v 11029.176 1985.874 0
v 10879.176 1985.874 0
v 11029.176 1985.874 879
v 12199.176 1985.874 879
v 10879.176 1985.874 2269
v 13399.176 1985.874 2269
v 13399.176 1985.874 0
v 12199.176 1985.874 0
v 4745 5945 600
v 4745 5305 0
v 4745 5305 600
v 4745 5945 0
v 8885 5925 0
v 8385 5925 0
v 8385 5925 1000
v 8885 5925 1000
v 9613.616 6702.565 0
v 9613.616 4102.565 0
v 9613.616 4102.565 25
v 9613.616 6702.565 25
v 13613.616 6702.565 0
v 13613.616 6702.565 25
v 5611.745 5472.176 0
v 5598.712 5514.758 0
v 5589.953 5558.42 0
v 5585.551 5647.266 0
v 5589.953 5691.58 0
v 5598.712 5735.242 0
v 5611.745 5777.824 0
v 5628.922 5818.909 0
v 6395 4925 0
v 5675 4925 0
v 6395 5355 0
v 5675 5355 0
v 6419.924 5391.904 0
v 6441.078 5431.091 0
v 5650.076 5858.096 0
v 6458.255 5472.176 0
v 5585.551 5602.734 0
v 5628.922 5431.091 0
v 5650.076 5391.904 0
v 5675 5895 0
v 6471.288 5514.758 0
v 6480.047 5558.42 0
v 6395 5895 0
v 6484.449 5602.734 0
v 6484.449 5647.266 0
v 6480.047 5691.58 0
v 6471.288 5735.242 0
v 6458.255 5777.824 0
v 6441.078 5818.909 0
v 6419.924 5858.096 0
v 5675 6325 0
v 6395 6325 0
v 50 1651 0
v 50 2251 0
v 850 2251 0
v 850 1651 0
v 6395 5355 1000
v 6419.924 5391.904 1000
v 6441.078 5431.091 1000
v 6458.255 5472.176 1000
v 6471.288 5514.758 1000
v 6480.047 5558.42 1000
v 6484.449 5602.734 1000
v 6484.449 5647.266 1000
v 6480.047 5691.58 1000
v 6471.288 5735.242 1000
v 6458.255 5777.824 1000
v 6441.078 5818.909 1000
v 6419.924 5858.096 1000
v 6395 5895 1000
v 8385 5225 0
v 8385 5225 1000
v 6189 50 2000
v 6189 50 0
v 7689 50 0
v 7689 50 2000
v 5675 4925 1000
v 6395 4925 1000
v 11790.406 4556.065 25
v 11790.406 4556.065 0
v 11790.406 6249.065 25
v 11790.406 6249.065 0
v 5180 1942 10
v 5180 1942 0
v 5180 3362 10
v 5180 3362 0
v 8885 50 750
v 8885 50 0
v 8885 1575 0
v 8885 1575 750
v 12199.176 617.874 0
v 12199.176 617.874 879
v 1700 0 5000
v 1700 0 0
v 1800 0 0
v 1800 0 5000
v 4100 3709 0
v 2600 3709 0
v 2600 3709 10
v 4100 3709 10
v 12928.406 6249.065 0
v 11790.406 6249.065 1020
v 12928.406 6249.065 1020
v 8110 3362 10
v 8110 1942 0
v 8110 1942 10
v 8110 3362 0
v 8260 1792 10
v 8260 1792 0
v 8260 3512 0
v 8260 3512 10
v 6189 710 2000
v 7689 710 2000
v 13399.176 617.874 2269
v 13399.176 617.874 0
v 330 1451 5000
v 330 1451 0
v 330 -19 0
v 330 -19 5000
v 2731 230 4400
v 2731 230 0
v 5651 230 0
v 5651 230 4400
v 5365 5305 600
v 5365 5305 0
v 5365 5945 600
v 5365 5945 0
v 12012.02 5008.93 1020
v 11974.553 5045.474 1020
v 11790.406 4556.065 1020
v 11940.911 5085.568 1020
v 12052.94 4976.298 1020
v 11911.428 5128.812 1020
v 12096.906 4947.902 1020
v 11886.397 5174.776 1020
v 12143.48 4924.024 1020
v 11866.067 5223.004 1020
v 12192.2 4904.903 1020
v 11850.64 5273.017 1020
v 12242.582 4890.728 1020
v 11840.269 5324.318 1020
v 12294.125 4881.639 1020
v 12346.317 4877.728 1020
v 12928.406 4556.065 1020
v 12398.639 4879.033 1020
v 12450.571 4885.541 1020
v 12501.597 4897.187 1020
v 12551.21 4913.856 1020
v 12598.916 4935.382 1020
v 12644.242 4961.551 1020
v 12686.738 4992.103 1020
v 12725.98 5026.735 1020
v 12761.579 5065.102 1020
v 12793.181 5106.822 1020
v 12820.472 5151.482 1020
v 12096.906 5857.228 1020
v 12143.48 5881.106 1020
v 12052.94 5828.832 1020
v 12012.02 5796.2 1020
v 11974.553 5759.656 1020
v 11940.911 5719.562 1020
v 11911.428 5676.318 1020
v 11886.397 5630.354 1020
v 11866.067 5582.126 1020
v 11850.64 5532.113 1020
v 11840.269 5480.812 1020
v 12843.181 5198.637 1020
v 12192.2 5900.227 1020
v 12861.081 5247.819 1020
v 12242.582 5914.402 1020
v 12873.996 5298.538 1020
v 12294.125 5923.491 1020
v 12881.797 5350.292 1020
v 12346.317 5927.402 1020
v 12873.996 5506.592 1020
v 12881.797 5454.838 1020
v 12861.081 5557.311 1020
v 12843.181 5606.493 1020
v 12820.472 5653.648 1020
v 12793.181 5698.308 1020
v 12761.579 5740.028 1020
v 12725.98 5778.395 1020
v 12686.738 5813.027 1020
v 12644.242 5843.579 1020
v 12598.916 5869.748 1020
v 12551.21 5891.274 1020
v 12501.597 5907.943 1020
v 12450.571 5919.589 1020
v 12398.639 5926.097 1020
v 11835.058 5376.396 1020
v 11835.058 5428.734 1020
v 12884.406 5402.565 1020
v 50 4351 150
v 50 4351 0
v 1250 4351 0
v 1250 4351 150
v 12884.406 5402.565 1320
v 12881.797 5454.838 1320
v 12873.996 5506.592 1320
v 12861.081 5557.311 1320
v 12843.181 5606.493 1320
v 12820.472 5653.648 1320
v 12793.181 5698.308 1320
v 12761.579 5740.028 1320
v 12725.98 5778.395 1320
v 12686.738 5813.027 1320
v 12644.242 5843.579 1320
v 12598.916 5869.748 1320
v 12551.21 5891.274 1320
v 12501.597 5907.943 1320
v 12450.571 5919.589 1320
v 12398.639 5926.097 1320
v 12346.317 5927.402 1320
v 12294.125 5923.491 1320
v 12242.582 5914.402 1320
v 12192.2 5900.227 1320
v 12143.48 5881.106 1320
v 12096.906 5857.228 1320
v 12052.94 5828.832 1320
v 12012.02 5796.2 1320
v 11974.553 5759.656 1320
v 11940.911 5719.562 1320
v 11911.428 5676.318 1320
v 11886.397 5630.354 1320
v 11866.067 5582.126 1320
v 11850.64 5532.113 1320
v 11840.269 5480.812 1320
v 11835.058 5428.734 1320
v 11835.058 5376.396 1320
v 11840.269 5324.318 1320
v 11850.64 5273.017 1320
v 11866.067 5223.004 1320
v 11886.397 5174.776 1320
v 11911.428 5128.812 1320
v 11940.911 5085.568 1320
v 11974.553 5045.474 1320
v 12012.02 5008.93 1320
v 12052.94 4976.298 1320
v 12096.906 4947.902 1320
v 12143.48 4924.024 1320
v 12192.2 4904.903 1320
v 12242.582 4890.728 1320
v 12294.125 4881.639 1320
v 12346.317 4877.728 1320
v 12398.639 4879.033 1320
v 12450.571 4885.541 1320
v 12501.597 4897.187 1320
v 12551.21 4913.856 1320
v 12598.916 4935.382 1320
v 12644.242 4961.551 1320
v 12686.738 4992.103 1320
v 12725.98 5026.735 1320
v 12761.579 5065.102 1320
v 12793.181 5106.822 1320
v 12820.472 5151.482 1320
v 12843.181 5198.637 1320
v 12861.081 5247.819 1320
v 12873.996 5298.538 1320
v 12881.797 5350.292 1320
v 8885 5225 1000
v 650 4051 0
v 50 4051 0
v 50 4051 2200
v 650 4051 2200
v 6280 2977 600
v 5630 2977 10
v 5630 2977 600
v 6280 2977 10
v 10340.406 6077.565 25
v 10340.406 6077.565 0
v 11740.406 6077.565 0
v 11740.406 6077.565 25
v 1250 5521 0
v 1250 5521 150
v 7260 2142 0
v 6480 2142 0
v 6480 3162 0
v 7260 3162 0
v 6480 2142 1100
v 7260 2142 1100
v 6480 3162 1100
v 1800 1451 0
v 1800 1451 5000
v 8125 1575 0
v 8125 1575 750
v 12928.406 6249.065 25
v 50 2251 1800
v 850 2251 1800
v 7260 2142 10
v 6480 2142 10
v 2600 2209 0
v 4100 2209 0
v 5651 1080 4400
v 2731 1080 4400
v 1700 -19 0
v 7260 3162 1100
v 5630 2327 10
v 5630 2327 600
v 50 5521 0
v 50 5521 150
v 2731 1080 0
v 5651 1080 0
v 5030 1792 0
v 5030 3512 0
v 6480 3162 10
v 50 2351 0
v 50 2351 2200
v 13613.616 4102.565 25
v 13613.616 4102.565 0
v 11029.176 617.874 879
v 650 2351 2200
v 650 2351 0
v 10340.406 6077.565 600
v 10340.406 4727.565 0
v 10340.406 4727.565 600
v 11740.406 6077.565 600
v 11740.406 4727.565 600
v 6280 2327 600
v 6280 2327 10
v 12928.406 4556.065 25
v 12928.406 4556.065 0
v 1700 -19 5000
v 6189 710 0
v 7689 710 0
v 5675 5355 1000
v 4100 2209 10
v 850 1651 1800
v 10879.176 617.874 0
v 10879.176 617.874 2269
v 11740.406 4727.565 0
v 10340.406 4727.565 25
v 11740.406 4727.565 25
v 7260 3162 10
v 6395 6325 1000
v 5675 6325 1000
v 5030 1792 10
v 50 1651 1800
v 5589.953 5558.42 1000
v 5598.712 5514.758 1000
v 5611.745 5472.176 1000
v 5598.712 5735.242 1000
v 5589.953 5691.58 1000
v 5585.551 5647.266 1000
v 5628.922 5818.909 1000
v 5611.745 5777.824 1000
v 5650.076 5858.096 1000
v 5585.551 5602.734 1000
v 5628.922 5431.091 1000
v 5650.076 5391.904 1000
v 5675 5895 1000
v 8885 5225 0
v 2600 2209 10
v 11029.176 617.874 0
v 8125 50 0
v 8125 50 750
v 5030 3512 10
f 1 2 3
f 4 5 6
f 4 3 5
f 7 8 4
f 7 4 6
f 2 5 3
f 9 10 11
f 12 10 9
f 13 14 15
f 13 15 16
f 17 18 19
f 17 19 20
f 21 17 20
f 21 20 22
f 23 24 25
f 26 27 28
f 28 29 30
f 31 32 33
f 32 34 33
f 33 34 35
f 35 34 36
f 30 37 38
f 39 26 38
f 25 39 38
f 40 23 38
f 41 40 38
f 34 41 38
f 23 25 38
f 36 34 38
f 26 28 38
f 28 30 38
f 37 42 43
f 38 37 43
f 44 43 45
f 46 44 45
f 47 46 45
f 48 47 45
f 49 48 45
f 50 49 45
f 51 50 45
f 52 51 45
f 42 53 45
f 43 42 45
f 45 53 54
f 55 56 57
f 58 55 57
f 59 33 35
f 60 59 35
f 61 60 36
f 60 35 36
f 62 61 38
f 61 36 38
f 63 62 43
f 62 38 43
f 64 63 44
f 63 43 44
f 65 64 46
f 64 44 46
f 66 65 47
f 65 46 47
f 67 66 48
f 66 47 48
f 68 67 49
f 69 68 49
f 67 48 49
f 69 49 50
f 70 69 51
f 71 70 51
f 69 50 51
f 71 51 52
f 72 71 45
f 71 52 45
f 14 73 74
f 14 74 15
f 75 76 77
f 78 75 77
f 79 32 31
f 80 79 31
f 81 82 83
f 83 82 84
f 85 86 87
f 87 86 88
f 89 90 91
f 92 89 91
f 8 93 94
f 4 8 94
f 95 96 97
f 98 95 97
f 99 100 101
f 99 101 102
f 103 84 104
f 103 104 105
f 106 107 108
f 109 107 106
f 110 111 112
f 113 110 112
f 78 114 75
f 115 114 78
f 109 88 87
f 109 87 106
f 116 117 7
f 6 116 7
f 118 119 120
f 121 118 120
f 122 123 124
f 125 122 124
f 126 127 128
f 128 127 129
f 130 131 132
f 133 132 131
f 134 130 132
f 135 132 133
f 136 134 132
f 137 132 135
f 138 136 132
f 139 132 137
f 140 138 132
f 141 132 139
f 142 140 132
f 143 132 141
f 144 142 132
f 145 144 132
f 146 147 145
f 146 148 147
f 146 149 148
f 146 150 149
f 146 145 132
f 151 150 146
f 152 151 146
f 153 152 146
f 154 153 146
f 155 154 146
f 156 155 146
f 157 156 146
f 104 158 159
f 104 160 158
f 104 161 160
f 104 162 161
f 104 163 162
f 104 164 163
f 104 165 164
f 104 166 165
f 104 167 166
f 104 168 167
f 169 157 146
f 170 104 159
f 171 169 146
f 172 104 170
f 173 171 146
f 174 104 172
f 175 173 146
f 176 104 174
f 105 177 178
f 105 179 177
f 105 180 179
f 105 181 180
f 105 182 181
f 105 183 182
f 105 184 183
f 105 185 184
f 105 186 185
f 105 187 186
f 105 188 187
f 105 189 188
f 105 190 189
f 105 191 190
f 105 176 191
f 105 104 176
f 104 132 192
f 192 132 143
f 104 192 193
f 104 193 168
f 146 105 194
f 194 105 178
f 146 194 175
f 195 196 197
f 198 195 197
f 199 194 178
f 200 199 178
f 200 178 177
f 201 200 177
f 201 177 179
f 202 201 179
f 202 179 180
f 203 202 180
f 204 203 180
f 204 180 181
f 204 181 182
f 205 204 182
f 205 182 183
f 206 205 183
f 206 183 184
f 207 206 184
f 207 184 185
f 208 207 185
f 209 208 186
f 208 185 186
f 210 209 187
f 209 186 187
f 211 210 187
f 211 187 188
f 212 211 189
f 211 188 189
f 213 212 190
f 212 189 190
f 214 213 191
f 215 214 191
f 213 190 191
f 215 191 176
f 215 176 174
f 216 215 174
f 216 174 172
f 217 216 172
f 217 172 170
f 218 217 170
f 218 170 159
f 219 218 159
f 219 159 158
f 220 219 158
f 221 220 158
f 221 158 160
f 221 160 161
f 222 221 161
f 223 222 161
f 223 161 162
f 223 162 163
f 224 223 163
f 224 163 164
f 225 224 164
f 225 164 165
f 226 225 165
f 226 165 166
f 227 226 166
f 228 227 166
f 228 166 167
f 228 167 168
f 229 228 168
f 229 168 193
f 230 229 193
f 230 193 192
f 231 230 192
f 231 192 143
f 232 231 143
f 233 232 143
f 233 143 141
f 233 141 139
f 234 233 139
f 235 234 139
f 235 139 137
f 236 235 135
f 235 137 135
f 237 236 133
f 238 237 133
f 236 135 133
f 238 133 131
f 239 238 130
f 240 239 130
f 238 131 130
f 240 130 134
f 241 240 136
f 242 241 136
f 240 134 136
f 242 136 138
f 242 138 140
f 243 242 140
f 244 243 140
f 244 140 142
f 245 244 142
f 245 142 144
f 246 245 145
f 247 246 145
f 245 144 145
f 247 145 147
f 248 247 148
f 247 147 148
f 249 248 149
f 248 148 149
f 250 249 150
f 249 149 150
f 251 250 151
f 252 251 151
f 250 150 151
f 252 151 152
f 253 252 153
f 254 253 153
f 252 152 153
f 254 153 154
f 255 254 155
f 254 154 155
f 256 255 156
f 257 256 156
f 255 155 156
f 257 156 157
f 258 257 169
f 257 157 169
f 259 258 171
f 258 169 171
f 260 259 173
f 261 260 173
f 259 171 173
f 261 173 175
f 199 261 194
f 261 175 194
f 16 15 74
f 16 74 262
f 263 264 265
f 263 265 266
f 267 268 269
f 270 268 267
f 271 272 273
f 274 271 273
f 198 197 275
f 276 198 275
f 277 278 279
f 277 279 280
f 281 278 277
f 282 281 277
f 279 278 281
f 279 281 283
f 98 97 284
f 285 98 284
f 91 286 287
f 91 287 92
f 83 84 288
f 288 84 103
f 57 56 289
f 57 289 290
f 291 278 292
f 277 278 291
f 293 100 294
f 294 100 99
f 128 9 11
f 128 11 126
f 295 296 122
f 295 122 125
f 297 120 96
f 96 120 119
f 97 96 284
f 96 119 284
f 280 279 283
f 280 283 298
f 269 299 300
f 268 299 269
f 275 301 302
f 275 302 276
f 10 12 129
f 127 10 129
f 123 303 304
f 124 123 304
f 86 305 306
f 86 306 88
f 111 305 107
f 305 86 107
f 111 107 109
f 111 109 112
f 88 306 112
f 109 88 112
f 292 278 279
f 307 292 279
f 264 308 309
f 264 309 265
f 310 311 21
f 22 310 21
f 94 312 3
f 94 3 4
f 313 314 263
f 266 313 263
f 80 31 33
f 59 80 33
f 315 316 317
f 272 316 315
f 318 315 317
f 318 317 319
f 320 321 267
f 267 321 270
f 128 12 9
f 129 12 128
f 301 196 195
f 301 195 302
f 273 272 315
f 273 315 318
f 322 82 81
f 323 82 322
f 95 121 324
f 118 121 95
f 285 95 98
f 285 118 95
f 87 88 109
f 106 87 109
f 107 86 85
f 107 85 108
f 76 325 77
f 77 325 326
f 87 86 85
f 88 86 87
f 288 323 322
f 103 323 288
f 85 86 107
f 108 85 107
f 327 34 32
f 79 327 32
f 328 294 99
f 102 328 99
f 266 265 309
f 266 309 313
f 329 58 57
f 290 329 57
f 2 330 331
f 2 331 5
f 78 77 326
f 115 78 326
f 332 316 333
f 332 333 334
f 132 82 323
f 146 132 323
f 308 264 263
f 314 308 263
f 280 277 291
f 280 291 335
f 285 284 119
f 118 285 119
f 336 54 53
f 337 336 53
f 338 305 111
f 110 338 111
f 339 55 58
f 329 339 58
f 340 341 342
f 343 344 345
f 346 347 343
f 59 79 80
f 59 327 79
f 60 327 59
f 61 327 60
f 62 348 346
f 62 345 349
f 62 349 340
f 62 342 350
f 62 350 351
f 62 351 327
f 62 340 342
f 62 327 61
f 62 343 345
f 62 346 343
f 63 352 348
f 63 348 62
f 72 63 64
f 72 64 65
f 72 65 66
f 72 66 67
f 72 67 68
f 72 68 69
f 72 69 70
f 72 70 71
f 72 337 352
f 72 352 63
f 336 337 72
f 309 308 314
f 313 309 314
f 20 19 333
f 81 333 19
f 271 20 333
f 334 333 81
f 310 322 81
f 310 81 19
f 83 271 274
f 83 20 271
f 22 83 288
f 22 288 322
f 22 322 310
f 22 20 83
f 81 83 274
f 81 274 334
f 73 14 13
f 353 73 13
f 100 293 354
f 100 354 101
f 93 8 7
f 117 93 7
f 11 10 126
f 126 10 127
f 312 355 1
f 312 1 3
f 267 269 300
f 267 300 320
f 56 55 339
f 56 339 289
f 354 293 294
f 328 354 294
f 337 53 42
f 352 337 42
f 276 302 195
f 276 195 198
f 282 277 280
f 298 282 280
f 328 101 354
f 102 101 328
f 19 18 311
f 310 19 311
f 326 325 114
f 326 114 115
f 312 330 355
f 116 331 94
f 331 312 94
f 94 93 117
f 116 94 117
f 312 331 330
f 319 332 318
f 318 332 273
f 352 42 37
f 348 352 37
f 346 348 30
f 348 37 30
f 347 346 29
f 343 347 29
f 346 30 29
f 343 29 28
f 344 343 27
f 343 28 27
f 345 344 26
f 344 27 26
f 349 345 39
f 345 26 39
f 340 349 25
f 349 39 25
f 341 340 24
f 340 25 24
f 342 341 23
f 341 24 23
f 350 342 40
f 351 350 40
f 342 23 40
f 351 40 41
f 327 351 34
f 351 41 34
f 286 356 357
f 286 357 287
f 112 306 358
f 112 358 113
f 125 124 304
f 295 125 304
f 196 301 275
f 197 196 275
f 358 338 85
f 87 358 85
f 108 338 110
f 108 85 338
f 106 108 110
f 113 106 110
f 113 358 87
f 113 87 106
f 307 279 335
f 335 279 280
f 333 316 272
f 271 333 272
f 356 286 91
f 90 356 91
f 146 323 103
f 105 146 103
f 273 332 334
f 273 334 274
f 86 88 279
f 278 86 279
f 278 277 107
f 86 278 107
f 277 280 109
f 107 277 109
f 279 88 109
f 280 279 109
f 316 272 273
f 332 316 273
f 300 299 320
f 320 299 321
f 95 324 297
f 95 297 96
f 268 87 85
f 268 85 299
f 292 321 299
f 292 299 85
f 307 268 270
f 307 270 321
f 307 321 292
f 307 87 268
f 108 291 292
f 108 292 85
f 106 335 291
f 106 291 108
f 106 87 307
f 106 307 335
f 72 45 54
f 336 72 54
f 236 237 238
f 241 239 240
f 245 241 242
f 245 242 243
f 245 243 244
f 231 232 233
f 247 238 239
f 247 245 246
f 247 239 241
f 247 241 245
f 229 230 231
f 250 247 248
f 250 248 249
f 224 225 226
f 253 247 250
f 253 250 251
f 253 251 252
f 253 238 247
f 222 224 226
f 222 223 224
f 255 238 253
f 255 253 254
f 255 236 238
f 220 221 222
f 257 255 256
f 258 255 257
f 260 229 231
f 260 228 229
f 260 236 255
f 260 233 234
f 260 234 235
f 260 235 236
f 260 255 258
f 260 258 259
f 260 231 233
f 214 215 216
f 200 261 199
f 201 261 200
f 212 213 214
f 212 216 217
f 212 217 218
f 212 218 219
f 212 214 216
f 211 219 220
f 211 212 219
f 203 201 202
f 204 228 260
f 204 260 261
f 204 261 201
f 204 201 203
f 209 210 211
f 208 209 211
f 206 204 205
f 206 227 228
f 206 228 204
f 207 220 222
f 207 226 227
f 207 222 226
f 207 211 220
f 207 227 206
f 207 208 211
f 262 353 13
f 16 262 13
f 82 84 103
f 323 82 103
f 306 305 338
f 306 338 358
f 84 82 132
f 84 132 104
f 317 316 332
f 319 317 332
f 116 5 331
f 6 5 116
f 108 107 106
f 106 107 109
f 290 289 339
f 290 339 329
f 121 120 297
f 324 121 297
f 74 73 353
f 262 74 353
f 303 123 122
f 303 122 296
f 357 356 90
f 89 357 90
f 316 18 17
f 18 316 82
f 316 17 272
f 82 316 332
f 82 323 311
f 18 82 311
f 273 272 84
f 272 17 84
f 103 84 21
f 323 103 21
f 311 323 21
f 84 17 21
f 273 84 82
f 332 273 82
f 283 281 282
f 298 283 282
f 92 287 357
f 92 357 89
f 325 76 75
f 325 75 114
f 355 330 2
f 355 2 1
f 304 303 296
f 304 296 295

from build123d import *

# Parameters (mm, degrees)
F2_DEPTH  = 5000
F1_W      = 2920
F1_H      = 850
F3_DEPTH  = 4400
F1_W_2    = 1500
F1_H_2    = 660
F4_DEPTH  = 2000
F1_W_3    = 780
F1_H_3    = 1020
F5_DEPTH  = 1100
F1_W_4    = 760
F1_H_4    = 1525
F6_DEPTH  = 750
F7_DEPTH  = 1000
F1_W_5    = 500
F1_H_5    = 700
F8_DEPTH  = 1000
F1_W_6    = 620
F1_H_6    = 640
F9_DEPTH  = 600
F1_W_7    = 600
F1_H_7    = 1700
F10_DEPTH = 2200
F1_W_8    = 800
F1_H_8    = 600
F11_DEPTH = 1800
F1_H_9    = 1500
F12_DEPTH = 10
F1_W_9    = 1200
F1_H_10   = 1170
F13_DEPTH = 150
F1_W_10   = 3230
F1_H_11   = 1720
F1_W_11   = 2930
F1_H_12   = 1420
F14_DEPTH = 10
F1_W_12   = 650
F1_H_13   = 650
F15_DEPTH = 10
F16_W     = 1138
F16_H     = 1693
F16_R     = 525
F17_DEPTH = 1020
F18_DEPTH = 1320
F16_W_2   = 1400
F16_H_2   = 1350
F19_DEPTH = 600
F16_W_3   = 4000
F16_H_3   = 2600
F20_DEPTH = 25
F21_W     = 2520
F21_H     = 1368
F22_DEPTH = 2269
F23_W     = 1170
F23_H     = 879
F24_DEPTH = 1368
F25_DEPTH = 600


with BuildPart() as f2:
    # F1 (on face) → F2 (new body)
    with BuildSketch(Plane.XY):
        Polygon((330, 1451), (330, -19), (1700, -19), (1700, 0), (1800, 0), (1800, 1451), align=None)
    extrude(amount=F2_DEPTH)


with BuildPart() as f3:
    # F1 (on face) → F3 (new body)
    with BuildSketch(Plane.XY):
        with Locations((4191, 655)):
            Rectangle(F1_W, F1_H)
    extrude(amount=F3_DEPTH)


with BuildPart() as f4:
    # F1 (on face) → F4 (new body)
    with BuildSketch(Plane.XY):
        with Locations((6939, 380)):
            Rectangle(F1_W_2, F1_H_2)
    extrude(amount=F4_DEPTH)


with BuildPart() as f5:
    # F1 (on face) → F5 (new body)
    with BuildSketch(Plane.XY):
        with Locations((6870, 2652)):
            Rectangle(F1_W_3, F1_H_3)
    extrude(amount=F5_DEPTH)


with BuildPart() as f6:
    # F1 (on face) → F6 (new body)
    with BuildSketch(Plane.XY):
        with Locations((8505, 812.5)):
            Rectangle(F1_W_4, F1_H_4)
    extrude(amount=F6_DEPTH)


with BuildPart() as f7:
    # F1 (on face) → F7 (new body)
    with BuildSketch(Plane.XY):
        with BuildLine():
            ThreePointArc((6395, 5895), (6035, 6075), (5675, 5895))
            Line((5675, 5895), (5675, 5355))
            ThreePointArc((5675, 5355), (6035, 5175), (6395, 5355))
            Line((6395, 5355), (6395, 5895))
        make_face()
        with BuildLine():
            ThreePointArc((6395, 5355), (6035, 5175), (5675, 5355))
            Line((5675, 5355), (5675, 4925))
            Line((5675, 4925), (6395, 4925))
            Line((6395, 4925), (6395, 5355))
        make_face()
        with BuildLine():
            Line((6395, 6325), (5675, 6325))
            Line((5675, 6325), (5675, 5895))
            ThreePointArc((5675, 5895), (6035, 6075), (6395, 5895))
            Line((6395, 5895), (6395, 6325))
        make_face()
        with BuildLine():
            ThreePointArc((6485, 5625), (6461.9074841227, 5767.3024947076), (6395, 5895))
            Line((6395, 5895), (6395, 5355))
            ThreePointArc((6395, 5355), (6461.9074841227, 5482.6975052924), (6485, 5625))
        make_face()
        with BuildLine():
            Line((5675, 5355), (5675, 5895))
            ThreePointArc((5675, 5895), (5585, 5625), (5675, 5355))
        make_face()
    extrude(amount=F7_DEPTH)


with BuildPart() as f8:
    # F1 (on face) → F8 (new body)
    with BuildSketch(Plane.XY):
        with Locations((8635, 5575)):
            Rectangle(F1_W_5, F1_H_5)
    extrude(amount=F8_DEPTH)


with BuildPart() as f9:
    # F1 (on face) → F9 (new body)
    with BuildSketch(Plane.XY):
        with Locations((5055, 5625)):
            Rectangle(F1_W_6, F1_H_6)
    extrude(amount=F9_DEPTH)


with BuildPart() as f10:
    # F1 (on face) → F10 (new body)
    with BuildSketch(Plane.XY):
        with Locations((350, 3201)):
            Rectangle(F1_W_7, F1_H_7)
    extrude(amount=F10_DEPTH)


with BuildPart() as f11:
    # F1 (on face) → F11 (new body)
    with BuildSketch(Plane.XY):
        with Locations((450, 1951)):
            Rectangle(F1_W_8, F1_H_8)
    extrude(amount=F11_DEPTH)


with BuildPart() as f12:
    # F1 (on face) → F12 (new body)
    with BuildSketch(Plane.XY):
        with Locations((3350, 2959)):
            Rectangle(F1_W_2, F1_H_9)
    extrude(amount=F12_DEPTH)


with BuildPart() as f13:
    # F1 (on face) → F13 (new body)
    with BuildSketch(Plane.XY):
        with Locations((650, 4936)):
            Rectangle(F1_W_9, F1_H_10)
    extrude(amount=F13_DEPTH)


with BuildPart() as f14:
    # F1 (on face) → F14 (new body)
    with BuildSketch(Plane.XY):
        with Locations((6645, 2652)):
            Rectangle(F1_W_10, F1_H_11)
        with Locations((6645, 2652)):
            Rectangle(F1_W_11, F1_H_12, mode=Mode.SUBTRACT)
    extrude(amount=F14_DEPTH)


with BuildPart() as f15:
    # F1 (on face) → F15 (new body)
    with BuildSketch(Plane.XY):
        with Locations((6645, 2652)):
            Rectangle(F1_W_11, F1_H_12)
        with Locations((5955, 2652)):
            Rectangle(F1_W_12, F1_H_13, mode=Mode.SUBTRACT)
        with Locations((6870, 2652)):
            Rectangle(F1_W_3, F1_H_3, mode=Mode.SUBTRACT)
    extrude(amount=F15_DEPTH)

    # F1 (on face) → F25 (join)
    with BuildSketch(Plane.XY):
        with Locations((5955, 2652)):
            Rectangle(F1_W_12, F1_H_13)
    extrude(amount=F25_DEPTH)


with BuildPart() as f17:
    # F16 (on face) → F17 (new body)
    with BuildSketch(Plane.XY):
        with Locations((12359.4055175781, 5402.5650024414)):
            Rectangle(F16_W, F16_H)
        with Locations((12359.4055175781, 5402.5650024414)):
            Circle(F16_R, mode=Mode.SUBTRACT)
    extrude(amount=F17_DEPTH)

    # F16 (on face) → F18 (join)
    with BuildSketch(Plane.XY):
        with Locations((12359.4055175781, 5402.5650024414)):
            Circle(F16_R)
    extrude(amount=F18_DEPTH)


with BuildPart() as f19:
    # F16 (on face) → F19 (new body)
    with BuildSketch(Plane.XY):
        with Locations((11040.4055175781, 5402.5650024414)):
            Rectangle(F16_W_2, F16_H_2)
    extrude(amount=F19_DEPTH)


with BuildPart() as f20:
    # F16 (on face) → F20 (new body)
    with BuildSketch(Plane.XY):
        with Locations((11613.6159896851, 5402.5650024414)):
            Rectangle(F16_W_3, F16_H_3)
        with Locations((11040.4055175781, 5402.5650024414)):
            Rectangle(F16_W_2, F16_H_2, mode=Mode.SUBTRACT)
        with Locations((12359.4055175781, 5402.5650024414)):
            Rectangle(F16_W, F16_H, mode=Mode.SUBTRACT)
    extrude(amount=F20_DEPTH)


with BuildPart() as f22:
    # F21 (on face) → F22 (new body)
    with BuildSketch(Plane.XY):
        with Locations((12139.1763687134, 1301.8739210856)):
            Rectangle(F21_W, F21_H)
    extrude(amount=F22_DEPTH)

    # F23 (on face) → F24 (cut, through all)
    with BuildSketch(Plane.XZ.offset(-617.8739210856)):
        with Locations((11614.1763687134, 439.5)):
            Rectangle(F23_W, F23_H)
    extrude(amount=-F24_DEPTH, mode=Mode.SUBTRACT)


solid = Compound([f2.part, f3.part, f4.part, f5.part, f6.part, f7.part, f8.part, f9.part, f10.part, f11.part, f12.part, f13.part, f14.part, f15.part, f17.part, f19.part, f20.part, f22.part])
